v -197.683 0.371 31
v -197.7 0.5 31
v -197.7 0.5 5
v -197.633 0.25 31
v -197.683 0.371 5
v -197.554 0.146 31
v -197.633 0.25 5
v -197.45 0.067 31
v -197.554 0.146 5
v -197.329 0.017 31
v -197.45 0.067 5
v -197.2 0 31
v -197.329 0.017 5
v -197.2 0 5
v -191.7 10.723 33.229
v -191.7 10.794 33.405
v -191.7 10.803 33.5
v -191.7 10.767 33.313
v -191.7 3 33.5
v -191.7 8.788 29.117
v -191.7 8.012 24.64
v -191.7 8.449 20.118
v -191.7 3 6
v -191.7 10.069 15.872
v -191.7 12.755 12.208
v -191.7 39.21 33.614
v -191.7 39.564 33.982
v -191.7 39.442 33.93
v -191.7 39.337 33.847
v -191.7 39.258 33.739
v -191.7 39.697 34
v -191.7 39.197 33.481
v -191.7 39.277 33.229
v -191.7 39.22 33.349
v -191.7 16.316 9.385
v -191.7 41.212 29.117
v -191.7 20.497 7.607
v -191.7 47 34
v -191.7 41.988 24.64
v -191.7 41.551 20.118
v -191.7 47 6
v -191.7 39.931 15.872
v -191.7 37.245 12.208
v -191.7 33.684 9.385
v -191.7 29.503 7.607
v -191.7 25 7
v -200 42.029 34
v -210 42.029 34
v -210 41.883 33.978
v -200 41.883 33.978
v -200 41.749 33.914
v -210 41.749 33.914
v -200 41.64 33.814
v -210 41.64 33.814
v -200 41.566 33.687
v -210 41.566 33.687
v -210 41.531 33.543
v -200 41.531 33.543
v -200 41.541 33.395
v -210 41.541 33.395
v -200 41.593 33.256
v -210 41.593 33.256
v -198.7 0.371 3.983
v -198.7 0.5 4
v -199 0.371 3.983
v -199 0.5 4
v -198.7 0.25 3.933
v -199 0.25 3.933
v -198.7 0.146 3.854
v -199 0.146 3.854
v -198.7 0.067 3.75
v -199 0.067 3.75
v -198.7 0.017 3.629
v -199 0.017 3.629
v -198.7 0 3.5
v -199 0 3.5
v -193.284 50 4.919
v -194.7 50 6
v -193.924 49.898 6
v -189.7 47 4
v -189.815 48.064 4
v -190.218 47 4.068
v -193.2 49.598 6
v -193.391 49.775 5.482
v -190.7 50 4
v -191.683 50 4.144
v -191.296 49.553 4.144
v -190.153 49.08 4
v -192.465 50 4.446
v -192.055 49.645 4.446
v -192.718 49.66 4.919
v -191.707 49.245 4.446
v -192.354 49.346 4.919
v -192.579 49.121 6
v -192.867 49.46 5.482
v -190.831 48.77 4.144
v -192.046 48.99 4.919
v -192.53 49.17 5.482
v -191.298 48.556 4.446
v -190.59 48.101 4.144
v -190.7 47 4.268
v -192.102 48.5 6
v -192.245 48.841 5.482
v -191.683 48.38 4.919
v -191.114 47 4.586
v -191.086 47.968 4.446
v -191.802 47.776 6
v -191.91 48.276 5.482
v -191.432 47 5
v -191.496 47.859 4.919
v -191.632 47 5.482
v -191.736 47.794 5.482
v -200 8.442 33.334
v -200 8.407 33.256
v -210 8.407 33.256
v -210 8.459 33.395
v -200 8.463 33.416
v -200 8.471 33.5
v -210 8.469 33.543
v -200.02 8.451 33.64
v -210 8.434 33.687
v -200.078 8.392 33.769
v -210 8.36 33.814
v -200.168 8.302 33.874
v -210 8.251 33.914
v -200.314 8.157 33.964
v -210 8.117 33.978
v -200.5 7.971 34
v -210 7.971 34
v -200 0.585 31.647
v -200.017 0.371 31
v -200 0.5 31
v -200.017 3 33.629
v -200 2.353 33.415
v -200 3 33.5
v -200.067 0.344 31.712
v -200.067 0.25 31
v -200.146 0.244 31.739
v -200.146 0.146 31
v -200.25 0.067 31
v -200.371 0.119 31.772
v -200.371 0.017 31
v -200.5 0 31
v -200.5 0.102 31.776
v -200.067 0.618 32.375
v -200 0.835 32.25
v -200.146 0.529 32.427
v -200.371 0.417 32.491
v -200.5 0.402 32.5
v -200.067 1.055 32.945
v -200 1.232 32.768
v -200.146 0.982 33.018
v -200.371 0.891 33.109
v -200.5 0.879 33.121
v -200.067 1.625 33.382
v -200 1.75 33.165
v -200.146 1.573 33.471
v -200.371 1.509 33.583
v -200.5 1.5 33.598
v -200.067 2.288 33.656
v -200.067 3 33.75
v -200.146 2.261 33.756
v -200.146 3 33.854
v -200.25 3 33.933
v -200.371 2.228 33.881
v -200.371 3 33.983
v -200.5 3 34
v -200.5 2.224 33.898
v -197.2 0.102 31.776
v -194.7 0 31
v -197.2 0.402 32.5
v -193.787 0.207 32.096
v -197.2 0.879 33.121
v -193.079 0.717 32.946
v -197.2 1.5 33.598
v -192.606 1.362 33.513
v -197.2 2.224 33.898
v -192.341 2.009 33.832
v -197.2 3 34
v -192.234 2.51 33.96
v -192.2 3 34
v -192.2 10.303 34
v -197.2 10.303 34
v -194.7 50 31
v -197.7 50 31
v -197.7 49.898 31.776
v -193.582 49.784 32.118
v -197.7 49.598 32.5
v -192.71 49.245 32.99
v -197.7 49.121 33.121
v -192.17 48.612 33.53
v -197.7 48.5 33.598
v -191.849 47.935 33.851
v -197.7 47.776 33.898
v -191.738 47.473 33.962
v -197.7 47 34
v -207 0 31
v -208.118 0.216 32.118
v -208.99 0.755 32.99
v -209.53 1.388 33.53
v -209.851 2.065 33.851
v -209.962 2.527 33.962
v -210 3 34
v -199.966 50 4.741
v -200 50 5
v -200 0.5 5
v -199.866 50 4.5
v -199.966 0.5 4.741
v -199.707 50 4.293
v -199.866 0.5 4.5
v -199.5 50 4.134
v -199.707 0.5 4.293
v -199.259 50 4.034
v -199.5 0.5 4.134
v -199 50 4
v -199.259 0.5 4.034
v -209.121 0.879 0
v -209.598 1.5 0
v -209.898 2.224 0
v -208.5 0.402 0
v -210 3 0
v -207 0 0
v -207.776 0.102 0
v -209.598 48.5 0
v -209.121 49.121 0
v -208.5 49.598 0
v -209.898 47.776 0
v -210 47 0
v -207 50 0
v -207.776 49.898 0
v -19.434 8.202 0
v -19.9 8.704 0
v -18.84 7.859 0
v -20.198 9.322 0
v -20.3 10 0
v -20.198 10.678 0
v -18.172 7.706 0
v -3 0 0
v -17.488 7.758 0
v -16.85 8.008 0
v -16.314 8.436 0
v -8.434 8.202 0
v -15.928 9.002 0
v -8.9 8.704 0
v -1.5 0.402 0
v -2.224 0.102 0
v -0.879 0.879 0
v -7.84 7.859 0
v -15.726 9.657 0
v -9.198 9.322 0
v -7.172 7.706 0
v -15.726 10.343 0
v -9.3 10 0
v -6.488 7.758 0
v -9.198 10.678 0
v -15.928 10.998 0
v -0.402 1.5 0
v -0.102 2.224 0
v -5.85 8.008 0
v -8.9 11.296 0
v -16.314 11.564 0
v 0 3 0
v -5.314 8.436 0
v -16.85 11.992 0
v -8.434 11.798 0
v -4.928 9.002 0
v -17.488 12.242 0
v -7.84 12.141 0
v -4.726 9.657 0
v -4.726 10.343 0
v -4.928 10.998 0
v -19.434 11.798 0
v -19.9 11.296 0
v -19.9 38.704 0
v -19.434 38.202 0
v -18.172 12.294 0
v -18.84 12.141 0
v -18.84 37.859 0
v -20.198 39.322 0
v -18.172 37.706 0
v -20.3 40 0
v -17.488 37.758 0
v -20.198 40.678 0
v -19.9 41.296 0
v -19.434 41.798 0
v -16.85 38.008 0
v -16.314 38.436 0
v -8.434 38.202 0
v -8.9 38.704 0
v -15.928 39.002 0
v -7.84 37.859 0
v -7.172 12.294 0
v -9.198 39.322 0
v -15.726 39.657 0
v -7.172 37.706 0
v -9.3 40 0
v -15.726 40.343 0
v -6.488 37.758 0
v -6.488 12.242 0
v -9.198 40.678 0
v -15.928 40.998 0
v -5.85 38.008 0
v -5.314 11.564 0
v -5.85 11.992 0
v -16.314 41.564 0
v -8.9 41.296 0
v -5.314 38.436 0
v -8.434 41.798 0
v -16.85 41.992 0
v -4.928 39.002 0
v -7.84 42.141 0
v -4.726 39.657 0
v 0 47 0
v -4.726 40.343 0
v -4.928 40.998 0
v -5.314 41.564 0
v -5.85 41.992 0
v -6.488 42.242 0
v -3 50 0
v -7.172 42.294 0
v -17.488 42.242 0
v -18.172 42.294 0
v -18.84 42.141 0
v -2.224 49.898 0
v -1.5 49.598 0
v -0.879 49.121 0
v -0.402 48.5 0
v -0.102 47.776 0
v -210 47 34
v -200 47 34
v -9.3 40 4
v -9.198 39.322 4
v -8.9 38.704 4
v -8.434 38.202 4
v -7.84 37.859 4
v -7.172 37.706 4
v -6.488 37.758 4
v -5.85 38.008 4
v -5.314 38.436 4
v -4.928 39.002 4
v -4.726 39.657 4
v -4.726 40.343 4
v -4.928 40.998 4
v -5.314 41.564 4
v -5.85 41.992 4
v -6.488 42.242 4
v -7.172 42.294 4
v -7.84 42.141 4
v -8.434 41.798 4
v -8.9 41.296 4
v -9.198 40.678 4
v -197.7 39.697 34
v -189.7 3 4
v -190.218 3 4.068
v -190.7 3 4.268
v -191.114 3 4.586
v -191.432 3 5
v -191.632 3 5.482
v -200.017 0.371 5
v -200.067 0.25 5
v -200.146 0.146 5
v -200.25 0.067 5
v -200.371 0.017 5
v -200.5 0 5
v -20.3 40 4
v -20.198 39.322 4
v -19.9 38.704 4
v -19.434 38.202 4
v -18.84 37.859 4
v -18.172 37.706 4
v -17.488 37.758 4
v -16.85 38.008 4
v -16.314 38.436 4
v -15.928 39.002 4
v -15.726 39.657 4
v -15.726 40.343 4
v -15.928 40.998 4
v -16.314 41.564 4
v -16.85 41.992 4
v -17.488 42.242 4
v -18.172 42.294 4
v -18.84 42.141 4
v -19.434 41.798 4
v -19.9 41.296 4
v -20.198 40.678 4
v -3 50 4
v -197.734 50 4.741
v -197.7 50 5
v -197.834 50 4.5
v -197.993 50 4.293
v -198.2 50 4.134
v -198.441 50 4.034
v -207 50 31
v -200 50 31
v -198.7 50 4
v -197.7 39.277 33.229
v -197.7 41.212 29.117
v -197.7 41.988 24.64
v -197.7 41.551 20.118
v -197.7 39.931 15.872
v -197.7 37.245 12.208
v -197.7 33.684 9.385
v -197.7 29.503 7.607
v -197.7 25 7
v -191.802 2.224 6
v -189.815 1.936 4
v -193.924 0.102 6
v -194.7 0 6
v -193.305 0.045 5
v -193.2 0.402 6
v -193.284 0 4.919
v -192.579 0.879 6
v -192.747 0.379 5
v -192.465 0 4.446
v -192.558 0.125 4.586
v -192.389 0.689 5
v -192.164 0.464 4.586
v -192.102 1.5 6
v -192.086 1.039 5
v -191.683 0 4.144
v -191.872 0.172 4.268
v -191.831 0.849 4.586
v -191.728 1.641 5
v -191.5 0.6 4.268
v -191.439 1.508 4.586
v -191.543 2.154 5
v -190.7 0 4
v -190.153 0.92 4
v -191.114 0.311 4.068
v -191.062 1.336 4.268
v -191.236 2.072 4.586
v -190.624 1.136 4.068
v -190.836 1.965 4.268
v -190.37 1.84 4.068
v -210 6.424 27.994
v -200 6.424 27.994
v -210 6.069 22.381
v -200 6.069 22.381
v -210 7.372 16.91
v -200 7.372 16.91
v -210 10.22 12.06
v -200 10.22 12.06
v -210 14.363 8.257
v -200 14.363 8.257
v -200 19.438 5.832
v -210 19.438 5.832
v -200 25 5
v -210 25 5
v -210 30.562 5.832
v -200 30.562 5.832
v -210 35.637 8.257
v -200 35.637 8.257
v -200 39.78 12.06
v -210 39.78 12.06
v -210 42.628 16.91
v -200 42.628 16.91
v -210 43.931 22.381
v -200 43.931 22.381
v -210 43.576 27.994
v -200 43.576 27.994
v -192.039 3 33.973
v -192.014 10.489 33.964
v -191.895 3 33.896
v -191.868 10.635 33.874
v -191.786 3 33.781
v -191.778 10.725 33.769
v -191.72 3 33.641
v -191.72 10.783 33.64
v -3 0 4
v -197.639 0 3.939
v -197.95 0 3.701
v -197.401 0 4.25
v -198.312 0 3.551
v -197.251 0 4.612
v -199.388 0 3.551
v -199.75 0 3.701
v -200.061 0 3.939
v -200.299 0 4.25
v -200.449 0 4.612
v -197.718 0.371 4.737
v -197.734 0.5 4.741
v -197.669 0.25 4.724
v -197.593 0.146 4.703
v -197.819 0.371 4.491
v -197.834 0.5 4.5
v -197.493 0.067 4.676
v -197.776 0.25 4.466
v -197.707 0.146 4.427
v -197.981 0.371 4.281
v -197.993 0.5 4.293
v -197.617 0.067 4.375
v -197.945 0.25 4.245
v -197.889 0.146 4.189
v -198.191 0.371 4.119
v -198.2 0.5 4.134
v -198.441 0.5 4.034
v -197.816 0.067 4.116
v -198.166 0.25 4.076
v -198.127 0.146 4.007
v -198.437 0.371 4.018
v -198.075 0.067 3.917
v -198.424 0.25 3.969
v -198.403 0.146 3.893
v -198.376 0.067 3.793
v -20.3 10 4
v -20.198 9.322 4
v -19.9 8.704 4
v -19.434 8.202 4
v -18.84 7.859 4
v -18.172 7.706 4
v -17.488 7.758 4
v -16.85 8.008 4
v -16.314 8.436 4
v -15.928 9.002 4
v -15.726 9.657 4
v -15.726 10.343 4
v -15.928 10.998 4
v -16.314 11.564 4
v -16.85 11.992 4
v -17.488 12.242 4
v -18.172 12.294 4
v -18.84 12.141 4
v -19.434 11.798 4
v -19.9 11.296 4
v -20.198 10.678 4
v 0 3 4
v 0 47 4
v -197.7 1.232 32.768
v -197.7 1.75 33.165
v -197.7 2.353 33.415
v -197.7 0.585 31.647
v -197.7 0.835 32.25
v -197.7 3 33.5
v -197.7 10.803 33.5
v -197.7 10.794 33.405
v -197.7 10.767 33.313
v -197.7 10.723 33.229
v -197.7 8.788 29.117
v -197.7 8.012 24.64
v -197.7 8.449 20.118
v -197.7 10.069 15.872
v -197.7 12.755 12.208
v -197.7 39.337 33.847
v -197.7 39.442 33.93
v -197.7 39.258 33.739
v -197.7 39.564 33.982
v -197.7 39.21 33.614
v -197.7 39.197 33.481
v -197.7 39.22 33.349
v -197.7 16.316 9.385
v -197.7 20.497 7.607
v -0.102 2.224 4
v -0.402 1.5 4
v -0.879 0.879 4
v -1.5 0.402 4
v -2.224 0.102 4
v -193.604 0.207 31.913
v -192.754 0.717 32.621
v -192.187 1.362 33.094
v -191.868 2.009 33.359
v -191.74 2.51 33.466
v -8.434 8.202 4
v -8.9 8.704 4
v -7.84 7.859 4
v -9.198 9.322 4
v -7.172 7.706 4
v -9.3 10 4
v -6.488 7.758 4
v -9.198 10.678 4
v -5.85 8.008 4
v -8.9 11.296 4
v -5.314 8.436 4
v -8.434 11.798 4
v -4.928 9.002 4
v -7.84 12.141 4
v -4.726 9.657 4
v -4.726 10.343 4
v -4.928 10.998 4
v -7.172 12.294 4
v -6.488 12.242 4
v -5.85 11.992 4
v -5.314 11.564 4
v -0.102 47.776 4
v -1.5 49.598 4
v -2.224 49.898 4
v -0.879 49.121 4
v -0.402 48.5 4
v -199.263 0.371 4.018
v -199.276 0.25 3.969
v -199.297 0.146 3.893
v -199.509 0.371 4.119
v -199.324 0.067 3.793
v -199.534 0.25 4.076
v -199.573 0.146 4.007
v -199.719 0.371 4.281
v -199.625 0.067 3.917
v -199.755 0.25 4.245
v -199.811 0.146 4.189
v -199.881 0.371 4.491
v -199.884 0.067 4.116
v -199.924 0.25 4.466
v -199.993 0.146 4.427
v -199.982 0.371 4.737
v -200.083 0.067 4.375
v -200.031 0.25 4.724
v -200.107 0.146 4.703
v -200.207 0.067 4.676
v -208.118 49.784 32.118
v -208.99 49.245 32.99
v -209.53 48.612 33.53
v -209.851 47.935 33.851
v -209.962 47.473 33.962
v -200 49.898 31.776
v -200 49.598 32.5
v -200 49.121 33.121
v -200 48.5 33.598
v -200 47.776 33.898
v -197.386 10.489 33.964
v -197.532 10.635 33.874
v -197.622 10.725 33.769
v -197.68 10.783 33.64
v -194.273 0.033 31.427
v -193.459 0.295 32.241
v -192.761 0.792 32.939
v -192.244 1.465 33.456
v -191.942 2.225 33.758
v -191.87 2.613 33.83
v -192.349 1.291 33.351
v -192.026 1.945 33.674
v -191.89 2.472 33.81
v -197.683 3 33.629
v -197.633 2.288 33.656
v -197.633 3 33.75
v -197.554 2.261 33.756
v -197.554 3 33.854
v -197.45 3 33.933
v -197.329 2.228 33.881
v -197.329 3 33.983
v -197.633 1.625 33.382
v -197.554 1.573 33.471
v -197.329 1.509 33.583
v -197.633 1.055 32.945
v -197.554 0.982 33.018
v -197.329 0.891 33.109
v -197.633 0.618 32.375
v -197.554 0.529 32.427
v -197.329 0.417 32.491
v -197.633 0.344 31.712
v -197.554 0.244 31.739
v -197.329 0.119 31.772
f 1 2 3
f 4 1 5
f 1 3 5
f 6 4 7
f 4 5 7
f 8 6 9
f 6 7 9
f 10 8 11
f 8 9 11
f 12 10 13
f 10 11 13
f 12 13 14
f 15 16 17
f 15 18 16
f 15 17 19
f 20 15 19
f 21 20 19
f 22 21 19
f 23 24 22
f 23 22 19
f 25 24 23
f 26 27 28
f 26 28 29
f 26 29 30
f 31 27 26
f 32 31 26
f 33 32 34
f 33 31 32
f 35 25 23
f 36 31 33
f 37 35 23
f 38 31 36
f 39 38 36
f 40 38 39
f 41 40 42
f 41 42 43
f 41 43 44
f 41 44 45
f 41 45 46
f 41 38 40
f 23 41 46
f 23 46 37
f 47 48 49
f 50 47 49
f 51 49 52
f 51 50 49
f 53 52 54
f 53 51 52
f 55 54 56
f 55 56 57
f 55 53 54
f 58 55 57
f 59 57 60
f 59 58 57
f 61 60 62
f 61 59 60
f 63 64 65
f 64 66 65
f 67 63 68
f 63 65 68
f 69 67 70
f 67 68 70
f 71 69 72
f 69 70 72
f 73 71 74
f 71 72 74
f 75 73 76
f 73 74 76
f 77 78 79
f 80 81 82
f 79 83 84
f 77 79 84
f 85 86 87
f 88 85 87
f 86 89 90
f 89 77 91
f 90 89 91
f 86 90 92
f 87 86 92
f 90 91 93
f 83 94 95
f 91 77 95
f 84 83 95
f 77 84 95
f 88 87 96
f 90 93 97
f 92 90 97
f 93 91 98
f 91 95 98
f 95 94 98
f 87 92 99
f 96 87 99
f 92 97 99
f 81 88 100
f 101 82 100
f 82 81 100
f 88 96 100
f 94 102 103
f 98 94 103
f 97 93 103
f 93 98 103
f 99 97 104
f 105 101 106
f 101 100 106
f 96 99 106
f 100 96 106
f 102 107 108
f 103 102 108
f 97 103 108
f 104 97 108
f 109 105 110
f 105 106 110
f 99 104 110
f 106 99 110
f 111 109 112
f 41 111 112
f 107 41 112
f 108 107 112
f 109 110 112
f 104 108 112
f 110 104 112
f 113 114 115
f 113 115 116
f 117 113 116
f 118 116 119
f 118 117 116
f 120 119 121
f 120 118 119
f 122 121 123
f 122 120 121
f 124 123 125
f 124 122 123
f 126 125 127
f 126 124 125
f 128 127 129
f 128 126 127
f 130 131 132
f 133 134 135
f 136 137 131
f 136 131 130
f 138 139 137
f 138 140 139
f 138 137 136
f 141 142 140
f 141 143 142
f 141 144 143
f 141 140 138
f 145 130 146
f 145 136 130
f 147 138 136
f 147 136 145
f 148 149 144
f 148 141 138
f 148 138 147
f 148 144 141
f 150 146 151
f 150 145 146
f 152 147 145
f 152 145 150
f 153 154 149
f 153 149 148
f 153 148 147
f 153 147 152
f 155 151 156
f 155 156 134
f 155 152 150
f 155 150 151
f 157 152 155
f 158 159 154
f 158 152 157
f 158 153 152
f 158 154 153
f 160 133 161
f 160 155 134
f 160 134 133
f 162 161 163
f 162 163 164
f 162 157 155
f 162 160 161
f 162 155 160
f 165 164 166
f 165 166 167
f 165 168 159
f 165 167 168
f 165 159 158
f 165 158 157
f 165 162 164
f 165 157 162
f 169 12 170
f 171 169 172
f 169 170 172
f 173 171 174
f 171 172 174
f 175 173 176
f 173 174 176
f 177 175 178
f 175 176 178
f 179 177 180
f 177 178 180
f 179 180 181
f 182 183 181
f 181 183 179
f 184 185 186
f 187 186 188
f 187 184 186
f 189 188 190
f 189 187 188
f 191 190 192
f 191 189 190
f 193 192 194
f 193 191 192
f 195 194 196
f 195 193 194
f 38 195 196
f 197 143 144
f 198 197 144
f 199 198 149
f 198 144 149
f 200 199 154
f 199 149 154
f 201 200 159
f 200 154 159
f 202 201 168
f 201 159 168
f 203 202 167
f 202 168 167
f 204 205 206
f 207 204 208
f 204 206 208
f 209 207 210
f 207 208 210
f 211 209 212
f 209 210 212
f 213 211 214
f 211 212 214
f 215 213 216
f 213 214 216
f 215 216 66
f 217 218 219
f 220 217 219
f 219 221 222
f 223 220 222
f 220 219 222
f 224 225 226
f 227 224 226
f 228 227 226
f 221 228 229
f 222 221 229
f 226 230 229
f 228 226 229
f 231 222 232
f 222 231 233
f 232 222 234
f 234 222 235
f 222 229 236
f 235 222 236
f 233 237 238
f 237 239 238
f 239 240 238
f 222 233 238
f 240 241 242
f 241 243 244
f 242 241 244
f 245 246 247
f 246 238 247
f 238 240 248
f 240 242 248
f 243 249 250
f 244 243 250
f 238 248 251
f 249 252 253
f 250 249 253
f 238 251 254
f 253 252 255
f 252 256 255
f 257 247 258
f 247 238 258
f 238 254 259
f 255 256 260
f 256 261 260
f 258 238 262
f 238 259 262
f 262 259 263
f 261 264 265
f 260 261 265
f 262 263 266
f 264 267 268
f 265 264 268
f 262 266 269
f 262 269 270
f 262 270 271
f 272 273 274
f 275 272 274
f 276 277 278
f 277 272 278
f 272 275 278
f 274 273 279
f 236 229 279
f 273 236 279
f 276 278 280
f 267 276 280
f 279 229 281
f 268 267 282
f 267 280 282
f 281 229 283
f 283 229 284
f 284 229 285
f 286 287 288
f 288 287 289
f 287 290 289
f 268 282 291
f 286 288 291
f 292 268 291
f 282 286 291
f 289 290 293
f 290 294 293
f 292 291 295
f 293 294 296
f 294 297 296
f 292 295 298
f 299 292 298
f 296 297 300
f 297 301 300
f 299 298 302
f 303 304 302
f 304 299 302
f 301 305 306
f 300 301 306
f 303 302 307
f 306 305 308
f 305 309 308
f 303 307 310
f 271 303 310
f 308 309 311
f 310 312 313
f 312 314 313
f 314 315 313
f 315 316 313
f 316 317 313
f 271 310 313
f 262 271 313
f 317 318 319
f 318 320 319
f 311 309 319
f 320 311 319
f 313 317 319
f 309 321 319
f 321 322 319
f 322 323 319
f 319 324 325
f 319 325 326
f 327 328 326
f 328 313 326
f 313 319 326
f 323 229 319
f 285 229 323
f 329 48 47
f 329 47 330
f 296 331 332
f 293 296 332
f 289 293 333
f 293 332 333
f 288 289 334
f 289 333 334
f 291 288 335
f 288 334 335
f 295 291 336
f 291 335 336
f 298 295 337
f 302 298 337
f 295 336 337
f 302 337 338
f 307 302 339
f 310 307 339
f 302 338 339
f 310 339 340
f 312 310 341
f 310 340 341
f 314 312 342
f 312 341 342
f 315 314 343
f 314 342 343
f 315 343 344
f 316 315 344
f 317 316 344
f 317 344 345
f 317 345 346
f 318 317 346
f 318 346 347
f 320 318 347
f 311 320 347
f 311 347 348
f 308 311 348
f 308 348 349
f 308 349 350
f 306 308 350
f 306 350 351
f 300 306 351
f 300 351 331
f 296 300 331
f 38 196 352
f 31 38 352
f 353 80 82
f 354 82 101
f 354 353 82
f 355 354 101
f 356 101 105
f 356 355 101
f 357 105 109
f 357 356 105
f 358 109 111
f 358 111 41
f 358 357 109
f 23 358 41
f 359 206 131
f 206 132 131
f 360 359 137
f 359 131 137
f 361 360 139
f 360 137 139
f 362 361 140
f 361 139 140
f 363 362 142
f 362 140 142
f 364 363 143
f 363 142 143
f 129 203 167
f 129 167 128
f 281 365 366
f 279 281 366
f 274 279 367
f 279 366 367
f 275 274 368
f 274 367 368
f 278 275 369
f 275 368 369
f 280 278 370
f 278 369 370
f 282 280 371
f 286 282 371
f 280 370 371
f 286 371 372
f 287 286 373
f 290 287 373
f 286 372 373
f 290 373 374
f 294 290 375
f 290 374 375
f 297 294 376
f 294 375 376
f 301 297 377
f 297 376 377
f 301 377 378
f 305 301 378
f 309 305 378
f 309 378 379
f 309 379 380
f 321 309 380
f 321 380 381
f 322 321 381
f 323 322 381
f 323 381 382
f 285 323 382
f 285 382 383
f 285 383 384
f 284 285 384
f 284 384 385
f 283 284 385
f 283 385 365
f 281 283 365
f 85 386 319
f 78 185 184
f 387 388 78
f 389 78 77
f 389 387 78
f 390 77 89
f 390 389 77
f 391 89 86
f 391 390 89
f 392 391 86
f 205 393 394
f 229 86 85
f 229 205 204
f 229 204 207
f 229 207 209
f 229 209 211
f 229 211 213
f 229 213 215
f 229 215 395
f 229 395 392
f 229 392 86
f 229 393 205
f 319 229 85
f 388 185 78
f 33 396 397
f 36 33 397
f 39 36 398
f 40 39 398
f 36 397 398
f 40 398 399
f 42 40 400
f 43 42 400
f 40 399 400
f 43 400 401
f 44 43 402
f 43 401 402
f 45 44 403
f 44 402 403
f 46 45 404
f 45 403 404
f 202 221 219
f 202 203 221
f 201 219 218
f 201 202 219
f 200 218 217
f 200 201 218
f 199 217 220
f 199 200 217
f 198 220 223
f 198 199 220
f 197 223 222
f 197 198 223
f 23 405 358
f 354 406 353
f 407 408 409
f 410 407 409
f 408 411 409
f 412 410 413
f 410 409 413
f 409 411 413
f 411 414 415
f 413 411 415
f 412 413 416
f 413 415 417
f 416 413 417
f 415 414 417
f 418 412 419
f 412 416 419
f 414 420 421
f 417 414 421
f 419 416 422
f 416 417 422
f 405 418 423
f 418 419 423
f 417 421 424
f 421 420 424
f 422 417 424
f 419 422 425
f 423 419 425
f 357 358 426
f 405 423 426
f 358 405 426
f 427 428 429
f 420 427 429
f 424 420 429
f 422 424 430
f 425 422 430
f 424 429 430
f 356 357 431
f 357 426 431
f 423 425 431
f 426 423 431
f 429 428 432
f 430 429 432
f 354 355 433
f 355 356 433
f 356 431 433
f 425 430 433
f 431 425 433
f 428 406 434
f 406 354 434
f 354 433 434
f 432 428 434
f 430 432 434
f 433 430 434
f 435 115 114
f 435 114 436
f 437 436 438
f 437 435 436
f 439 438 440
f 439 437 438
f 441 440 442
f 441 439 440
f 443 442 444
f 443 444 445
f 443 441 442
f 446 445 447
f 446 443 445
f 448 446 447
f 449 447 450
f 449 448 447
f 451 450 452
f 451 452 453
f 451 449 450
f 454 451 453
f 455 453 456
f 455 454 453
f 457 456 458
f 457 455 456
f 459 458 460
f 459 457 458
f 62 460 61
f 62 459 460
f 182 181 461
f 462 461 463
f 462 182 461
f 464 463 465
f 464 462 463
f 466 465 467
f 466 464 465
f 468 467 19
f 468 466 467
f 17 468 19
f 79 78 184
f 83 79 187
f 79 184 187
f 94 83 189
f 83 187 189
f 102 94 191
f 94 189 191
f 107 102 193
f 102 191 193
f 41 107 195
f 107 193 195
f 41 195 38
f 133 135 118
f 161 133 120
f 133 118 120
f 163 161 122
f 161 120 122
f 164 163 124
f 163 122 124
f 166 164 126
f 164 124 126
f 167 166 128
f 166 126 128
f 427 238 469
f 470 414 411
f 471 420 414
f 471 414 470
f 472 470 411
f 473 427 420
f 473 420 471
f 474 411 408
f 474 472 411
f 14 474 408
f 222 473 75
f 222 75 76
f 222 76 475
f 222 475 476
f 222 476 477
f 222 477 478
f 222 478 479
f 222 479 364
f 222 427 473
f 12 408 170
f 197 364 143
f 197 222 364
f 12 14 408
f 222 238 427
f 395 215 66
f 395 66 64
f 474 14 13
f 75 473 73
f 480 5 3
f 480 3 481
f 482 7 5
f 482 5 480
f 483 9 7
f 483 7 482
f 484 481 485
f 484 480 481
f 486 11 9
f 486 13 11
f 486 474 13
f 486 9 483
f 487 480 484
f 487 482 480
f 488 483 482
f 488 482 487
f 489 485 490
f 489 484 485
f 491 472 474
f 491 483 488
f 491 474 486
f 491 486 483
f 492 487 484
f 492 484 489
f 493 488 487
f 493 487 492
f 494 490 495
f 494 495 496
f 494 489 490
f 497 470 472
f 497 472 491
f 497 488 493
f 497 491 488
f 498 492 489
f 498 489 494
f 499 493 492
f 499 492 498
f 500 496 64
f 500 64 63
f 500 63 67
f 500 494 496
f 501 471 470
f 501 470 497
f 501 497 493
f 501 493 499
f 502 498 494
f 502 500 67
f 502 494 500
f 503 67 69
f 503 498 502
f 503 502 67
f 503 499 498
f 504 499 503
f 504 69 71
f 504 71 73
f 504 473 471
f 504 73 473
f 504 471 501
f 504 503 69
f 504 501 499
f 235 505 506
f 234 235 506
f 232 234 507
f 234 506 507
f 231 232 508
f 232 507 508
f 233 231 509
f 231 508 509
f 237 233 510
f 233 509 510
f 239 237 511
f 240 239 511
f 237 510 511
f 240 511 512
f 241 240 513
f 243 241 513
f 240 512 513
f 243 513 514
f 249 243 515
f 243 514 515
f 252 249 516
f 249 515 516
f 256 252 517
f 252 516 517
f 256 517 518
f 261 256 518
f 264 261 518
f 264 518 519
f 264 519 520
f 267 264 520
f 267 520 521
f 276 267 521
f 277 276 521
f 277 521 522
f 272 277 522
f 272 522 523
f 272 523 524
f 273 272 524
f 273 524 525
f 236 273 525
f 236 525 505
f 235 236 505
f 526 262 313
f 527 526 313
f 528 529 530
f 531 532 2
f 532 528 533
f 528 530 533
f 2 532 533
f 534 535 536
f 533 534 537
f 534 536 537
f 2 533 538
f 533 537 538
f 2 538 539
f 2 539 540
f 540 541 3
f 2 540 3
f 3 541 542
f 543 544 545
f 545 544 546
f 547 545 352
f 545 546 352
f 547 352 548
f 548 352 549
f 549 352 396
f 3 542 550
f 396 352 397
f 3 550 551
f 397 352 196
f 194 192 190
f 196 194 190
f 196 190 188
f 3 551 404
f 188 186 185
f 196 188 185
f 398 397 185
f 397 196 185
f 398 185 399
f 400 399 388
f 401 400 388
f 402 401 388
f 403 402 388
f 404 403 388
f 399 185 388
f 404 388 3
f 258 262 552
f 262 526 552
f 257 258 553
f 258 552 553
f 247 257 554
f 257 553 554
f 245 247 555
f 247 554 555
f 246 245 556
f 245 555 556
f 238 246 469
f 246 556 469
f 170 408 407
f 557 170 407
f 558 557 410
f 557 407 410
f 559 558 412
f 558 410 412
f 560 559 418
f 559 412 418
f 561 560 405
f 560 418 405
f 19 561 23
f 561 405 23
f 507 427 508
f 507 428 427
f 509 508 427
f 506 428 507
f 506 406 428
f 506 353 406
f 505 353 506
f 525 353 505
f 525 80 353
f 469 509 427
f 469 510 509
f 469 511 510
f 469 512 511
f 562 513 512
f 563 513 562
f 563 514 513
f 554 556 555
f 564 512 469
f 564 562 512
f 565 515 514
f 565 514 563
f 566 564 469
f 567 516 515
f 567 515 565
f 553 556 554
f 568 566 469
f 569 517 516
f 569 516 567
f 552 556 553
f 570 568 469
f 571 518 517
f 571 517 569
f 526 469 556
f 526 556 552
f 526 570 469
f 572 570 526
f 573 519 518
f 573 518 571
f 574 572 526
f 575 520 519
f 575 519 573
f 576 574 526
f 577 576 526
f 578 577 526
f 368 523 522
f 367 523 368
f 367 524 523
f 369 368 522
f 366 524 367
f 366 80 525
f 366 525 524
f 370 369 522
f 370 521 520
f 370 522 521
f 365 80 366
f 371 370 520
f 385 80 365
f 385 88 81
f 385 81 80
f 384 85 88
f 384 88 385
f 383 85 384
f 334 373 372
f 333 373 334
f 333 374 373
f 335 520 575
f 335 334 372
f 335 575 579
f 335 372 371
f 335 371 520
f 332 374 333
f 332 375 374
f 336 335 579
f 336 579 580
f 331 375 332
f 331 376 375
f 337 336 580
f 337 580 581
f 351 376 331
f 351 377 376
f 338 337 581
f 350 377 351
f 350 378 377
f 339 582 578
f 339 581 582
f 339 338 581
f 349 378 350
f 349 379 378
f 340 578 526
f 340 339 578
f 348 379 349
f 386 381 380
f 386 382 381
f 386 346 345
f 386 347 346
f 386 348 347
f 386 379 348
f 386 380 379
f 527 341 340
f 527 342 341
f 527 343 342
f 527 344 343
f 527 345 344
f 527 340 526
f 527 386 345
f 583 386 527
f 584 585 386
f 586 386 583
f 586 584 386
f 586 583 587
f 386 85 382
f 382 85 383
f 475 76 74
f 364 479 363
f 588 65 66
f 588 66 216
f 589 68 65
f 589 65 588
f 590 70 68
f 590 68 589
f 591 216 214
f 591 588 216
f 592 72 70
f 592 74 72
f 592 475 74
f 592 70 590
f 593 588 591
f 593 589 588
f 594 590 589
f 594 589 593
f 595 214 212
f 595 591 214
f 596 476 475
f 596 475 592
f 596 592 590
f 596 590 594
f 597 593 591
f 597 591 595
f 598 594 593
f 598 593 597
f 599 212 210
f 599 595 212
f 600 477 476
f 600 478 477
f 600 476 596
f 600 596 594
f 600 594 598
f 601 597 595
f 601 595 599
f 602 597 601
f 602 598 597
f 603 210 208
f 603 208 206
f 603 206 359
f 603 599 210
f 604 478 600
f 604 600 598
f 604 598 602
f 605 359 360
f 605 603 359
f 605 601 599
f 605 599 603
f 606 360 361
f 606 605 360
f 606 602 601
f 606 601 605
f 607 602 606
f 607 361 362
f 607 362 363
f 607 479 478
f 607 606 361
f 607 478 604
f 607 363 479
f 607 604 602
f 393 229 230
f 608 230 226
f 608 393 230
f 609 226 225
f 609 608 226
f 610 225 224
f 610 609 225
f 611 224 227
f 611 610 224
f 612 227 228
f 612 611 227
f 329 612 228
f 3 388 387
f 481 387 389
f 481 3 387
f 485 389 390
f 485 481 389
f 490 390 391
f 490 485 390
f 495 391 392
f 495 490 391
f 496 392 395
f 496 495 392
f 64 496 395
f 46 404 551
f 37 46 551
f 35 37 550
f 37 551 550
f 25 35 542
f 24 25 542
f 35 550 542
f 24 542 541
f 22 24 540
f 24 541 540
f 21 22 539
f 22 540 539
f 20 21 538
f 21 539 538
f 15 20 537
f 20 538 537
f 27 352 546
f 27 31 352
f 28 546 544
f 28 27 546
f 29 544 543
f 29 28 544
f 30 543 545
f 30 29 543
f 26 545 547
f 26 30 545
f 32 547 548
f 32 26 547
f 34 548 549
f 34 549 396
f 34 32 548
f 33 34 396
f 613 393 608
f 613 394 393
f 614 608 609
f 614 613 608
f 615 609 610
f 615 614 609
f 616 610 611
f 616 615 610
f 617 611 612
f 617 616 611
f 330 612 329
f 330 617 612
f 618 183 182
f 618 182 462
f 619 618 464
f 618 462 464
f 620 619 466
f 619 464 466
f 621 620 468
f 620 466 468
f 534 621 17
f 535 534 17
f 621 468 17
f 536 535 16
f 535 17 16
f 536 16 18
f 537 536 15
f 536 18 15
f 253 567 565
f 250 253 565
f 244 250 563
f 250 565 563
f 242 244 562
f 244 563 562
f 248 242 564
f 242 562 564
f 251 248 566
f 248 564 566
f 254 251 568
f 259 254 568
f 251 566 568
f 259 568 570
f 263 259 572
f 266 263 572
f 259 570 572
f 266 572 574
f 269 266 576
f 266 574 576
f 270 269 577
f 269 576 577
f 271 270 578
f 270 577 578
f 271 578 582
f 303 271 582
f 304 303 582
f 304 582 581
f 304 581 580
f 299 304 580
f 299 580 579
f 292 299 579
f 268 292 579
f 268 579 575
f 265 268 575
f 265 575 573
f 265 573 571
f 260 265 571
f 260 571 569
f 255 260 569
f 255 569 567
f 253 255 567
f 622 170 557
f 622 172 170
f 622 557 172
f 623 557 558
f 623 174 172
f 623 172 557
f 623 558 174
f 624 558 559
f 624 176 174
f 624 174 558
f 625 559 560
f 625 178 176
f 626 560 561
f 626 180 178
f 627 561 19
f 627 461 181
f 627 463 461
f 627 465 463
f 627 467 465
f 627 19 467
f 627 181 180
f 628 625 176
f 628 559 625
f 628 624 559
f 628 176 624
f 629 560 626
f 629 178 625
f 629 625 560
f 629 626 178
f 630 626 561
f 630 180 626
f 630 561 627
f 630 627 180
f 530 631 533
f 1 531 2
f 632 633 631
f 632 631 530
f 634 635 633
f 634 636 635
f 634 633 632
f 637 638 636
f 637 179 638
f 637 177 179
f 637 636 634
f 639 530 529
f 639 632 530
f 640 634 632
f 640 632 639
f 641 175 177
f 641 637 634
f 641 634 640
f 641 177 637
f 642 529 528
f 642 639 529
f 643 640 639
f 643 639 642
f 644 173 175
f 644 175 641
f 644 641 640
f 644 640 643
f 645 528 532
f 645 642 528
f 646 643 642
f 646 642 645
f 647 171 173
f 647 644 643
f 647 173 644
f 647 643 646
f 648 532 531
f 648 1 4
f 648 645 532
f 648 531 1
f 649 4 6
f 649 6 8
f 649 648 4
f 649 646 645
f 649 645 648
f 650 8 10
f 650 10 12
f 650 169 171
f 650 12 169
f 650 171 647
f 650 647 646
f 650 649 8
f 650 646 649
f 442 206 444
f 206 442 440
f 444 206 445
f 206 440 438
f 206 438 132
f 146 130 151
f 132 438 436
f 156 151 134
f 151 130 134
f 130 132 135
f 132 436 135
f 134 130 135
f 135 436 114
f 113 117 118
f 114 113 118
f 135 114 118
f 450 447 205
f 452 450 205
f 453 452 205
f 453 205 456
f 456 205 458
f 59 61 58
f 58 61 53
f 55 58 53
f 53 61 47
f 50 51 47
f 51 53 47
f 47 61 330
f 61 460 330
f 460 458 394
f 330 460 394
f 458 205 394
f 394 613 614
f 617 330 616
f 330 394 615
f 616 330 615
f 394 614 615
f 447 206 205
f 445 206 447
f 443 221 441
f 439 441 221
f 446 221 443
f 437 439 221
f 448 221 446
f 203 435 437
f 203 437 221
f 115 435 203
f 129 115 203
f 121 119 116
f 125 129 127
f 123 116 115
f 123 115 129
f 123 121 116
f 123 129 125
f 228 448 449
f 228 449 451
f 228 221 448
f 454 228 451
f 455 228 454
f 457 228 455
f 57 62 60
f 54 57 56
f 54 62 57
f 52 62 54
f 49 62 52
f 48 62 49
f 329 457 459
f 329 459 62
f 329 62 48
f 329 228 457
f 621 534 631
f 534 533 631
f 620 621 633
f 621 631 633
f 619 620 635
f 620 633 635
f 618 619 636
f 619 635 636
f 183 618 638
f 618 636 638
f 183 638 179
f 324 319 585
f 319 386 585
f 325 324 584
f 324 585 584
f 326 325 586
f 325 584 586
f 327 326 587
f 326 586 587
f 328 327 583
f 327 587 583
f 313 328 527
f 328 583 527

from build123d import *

# Parameters (mm, degrees)
SKETCH_1_W                      = 210
SKETCH_1_H                      = 50
EXTRUDE_1_DEPTH                 = 4
CUT_EXTRUDE_1_REACH             = 217.907
SKETCH_4_R                      = 2.3
CUT_EXTRUDE_1_DIRECTION_2_DEPTH = 216.907387553
EXTRUDE_2_DEPTH                 = 10
EXTRUDE_3_DEPTH                 = 6
FILLET_1_R                      = 3
FILLET_2_R                      = 2
FILLET_3_R                      = 1
FILLET_4_R                      = 0.5


# Some blends are built 0.0001 mm under size
with BuildPart() as part:
    # ｽｹｯﾁ1 → ﾎﾞｽ - 押し出し1 (new body)
    with BuildSketch(Plane.XY):
        with Locations((-105, 25)):
            Rectangle(SKETCH_1_W, SKETCH_1_H)
    extrude(amount=EXTRUDE_1_DEPTH)

    # ｽｹｯﾁ4 → ｶｯﾄ - 押し出し1 (cut, up to next)
    with BuildSketch(Plane.XY.offset(4), mode=Mode.PRIVATE) as cut_extrude_1_sk1:
        with Locations(Location((-7, 40, 0), (0, 0, 180))):
            Circle(SKETCH_4_R)
    cut_extrude_1_tool1 = extrude(cut_extrude_1_sk1.sketch, amount=-CUT_EXTRUDE_1_REACH, mode=Mode.PRIVATE) & part.part
    # ｽｹｯﾁ4 → ｶｯﾄ - 押し出し1 (cut, up to next)
    with BuildSketch(Plane.XY.offset(4), mode=Mode.PRIVATE) as cut_extrude_1_sk2:
        with Locations(Location((-18, 40, 0), (0, 0, 180))):
            Circle(SKETCH_4_R)
    cut_extrude_1_tool2 = extrude(cut_extrude_1_sk2.sketch, amount=-CUT_EXTRUDE_1_REACH, mode=Mode.PRIVATE) & part.part
    # ｽｹｯﾁ4 → ｶｯﾄ - 押し出し1 (cut, up to next)
    with BuildSketch(Plane.XY.offset(4), mode=Mode.PRIVATE) as cut_extrude_1_sk3:
        with Locations(Location((-7, 10, 0), (0, 0, 180))):
            Circle(SKETCH_4_R)
    cut_extrude_1_tool3 = extrude(cut_extrude_1_sk3.sketch, amount=-CUT_EXTRUDE_1_REACH, mode=Mode.PRIVATE) & part.part
    # ｽｹｯﾁ4 → ｶｯﾄ - 押し出し1 (cut, up to next)
    with BuildSketch(Plane.XY.offset(4), mode=Mode.PRIVATE) as cut_extrude_1_sk4:
        with Locations(Location((-18, 10, 0), (0, 0, 180))):
            Circle(SKETCH_4_R)
    cut_extrude_1_tool4 = extrude(cut_extrude_1_sk4.sketch, amount=-CUT_EXTRUDE_1_REACH, mode=Mode.PRIVATE) & part.part
    add(cut_extrude_1_tool1.solids().sort_by_distance((-7, 40, 4))[0], mode=Mode.SUBTRACT)
    add(cut_extrude_1_tool2.solids().sort_by_distance((-18, 40, 4))[0], mode=Mode.SUBTRACT)
    add(cut_extrude_1_tool3.solids().sort_by_distance((-7, 10, 4))[0], mode=Mode.SUBTRACT)
    add(cut_extrude_1_tool4.solids().sort_by_distance((-18, 10, 4))[0], mode=Mode.SUBTRACT)

    # ｽｹｯﾁ4 → ｶｯﾄ - 押し出し1 direction 2 (cut)
    with BuildSketch(Plane.XY.offset(4)):
        with Locations(Location((-7, 40, 0), (0, 0, 180))):
            Circle(SKETCH_4_R)
        with Locations(Location((-18, 40, 0), (0, 0, 180))):
            Circle(SKETCH_4_R)
        with Locations(Location((-7, 10, 0), (0, 0, 180))):
            Circle(SKETCH_4_R)
        with Locations(Location((-18, 10, 0), (0, 0, 180))):
            Circle(SKETCH_4_R)
    extrude(amount=CUT_EXTRUDE_1_DIRECTION_2_DEPTH, mode=Mode.SUBTRACT)

    # ｽｹｯﾁ5 → ﾎﾞｽ - 押し出し2 (add)
    with BuildSketch(Plane.ZY.offset(210)):
        with BuildLine():
            Line((34, 50), (4, 50))
            Line((4, 50), (4, 0))
            Line((4, 0), (34, 0))
            Line((34, 0), (34, 8.844505579))
            ThreePointArc((34, 8.844505579), (5, 25), (34, 41.155494421))
            Line((34, 41.155494421), (34, 50))
        make_face()
    extrude(amount=-EXTRUDE_2_DEPTH)

    # ｽｹｯﾁ6 → ﾎﾞｽ - 押し出し3 (add)
    with BuildSketch(Plane(origin=(-197.7, 0, 0), x_dir=(0, 0, -1), z_dir=(1, 0, 0))):
        with BuildLine():
            Line((-4, 50), (-34, 50))
            Line((-34, 50), (-34, 38.747727085))
            ThreePointArc((-34, 38.747727085), (-16.28637569, 40.149257408), (-7, 25))
            ThreePointArc((-7, 25), (-16.28637569, 9.850742592), (-34, 11.252272915))
            Line((-34, 11.252272915), (-34, 0))
            Line((-34, 0), (-4, 0))
            Line((-4, 0), (-4, 50))
        make_face()
    extrude(amount=EXTRUDE_3_DEPTH)

    # ﾌｨﾚｯﾄ1
    fillet_1_edges = [part.edges().sort_by_distance(p)[0] for p in [
        (-205, 0, 34),
        (-205, 50, 34),
        (-194.7, 0, 34),
        (-191.7, 50, 19),
        (-194.7, 50, 34),
        (-191.7, 0, 19),
        (0, 0, 2),
        (-210, 0, 17),
        (-210, 50, 17),
        (0, 50, 2),
    ]]
    fillet(fillet_1_edges, radius=FILLET_1_R)

    # ﾌｨﾚｯﾄ2
    # the kernel refuses this fillet: 2 mm, written as the material it adds along each edge
    with BuildSketch(Plane(origin=(-191.7, 3, 4), x_dir=(0, 0, 1), z_dir=(0, 1, 0))) as fillet_2_piece_1:
        with BuildLine():
            CenterArc((FILLET_2_R, FILLET_2_R), FILLET_2_R, 180, 90)
            Line((0, FILLET_2_R), (0, 0))
            Line((0, 0), (FILLET_2_R, 0))
        make_face()
    extrude(amount=44)
    with BuildSketch(Plane(origin=(-194.7, 3, 4), x_dir=(-0.9953436464450918, 0.0963899656675329, 0), z_dir=(0.0963899656675329, 0.9953436464450918, 0))) as fillet_2_piece_2_section:
        with BuildLine():
            CenterArc((3 + FILLET_2_R, FILLET_2_R), FILLET_2_R, 180, 90)
            Line((3 + FILLET_2_R, 0), (3, 0))
            Line((3, 0), (3, FILLET_2_R))
        make_face()
    fillet_2_piece_2 = revolve(axis=Axis((-194.7, 3, 4), (0, 0, 1)), revolution_arc=185.531326158, mode=Mode.PRIVATE)
    fillet_2_piece_2 = split(fillet_2_piece_2, bisect_by=Plane(origin=(-192.479113514, 0, 4.573600846), z_dir=(0, 1, 0)), keep=Keep.TOP, mode=Mode.PRIVATE)
    fillet_2_piece_2 = split(fillet_2_piece_2, bisect_by=Plane(origin=(-197.7, 0.779113097, 4.573600846), z_dir=(1, 0, 0)), keep=Keep.TOP, mode=Mode.PRIVATE)
    add(fillet_2_piece_2)
    with BuildSketch(Plane(origin=(-194.7, 47, 4), x_dir=(-0.9953436464450918, -0.09638996566753365, 0), z_dir=(0.09638996566753365, -0.9953436464450918, 0))) as fillet_2_piece_3_section:
        with BuildLine():
            CenterArc((3 + FILLET_2_R, -FILLET_2_R), FILLET_2_R, 90, 90)
            Line((3 + FILLET_2_R, 0), (3, 0))
            Line((3, 0), (3, -FILLET_2_R))
        make_face()
    fillet_2_piece_3 = revolve(axis=Axis((-194.7, 47, 4), (0, 0, -1)), revolution_arc=185.531326158, mode=Mode.PRIVATE)
    fillet_2_piece_3 = split(fillet_2_piece_3, bisect_by=Plane(origin=(-192.479113243, 50, 4.573600331), z_dir=(0, -1, 0)), keep=Keep.TOP, mode=Mode.PRIVATE)
    fillet_2_piece_3 = split(fillet_2_piece_3, bisect_by=Plane(origin=(-197.7, 49.22088673, 4.573600331), z_dir=(1, 0, 0)), keep=Keep.TOP, mode=Mode.PRIVATE)
    add(fillet_2_piece_3)

    # ﾌｨﾚｯﾄ3
    fillet_3_edges = [part.edges().sort_by_distance(p)[0] for p in [
        (-200, 25, 4),
        (-197.7, 25, 4),
    ]]
    fillet(fillet_3_edges, radius=FILLET_3_R - 0.0001)  # a hair under: the kernel refuses the full size

    # ﾌｨﾚｯﾄ4
    fillet_4_edges = [part.edges().sort_by_distance(p)[0] for p in [
        (-192.761853278, 0.71011195, 32.938146722),
        (-200, 5.922252789, 34),
        (-200, 0.878679656, 33.121320344),
        (-200, 0, 17.99995),
        (-199.707136071, 0, 4.292863929),
        (-198.85, 0, 4),
        (-197.992863929, 0, 4.292863929),
        (-197.7, 0, 17.99995),
        (-197.7, 0.878679656, 33.121320344),
        (-194.7, 11.252272915, 34),
        (-194.7, 38.747727085, 34),
        (-191.7, 7.126136458, 34),
        (-197.7, 7.126136458, 34),
        (-205, 8.844505579, 34),
        (-205, 41.155494421, 34),
    ]]
    fillet(fillet_4_edges, radius=FILLET_4_R)


solid = part.part
